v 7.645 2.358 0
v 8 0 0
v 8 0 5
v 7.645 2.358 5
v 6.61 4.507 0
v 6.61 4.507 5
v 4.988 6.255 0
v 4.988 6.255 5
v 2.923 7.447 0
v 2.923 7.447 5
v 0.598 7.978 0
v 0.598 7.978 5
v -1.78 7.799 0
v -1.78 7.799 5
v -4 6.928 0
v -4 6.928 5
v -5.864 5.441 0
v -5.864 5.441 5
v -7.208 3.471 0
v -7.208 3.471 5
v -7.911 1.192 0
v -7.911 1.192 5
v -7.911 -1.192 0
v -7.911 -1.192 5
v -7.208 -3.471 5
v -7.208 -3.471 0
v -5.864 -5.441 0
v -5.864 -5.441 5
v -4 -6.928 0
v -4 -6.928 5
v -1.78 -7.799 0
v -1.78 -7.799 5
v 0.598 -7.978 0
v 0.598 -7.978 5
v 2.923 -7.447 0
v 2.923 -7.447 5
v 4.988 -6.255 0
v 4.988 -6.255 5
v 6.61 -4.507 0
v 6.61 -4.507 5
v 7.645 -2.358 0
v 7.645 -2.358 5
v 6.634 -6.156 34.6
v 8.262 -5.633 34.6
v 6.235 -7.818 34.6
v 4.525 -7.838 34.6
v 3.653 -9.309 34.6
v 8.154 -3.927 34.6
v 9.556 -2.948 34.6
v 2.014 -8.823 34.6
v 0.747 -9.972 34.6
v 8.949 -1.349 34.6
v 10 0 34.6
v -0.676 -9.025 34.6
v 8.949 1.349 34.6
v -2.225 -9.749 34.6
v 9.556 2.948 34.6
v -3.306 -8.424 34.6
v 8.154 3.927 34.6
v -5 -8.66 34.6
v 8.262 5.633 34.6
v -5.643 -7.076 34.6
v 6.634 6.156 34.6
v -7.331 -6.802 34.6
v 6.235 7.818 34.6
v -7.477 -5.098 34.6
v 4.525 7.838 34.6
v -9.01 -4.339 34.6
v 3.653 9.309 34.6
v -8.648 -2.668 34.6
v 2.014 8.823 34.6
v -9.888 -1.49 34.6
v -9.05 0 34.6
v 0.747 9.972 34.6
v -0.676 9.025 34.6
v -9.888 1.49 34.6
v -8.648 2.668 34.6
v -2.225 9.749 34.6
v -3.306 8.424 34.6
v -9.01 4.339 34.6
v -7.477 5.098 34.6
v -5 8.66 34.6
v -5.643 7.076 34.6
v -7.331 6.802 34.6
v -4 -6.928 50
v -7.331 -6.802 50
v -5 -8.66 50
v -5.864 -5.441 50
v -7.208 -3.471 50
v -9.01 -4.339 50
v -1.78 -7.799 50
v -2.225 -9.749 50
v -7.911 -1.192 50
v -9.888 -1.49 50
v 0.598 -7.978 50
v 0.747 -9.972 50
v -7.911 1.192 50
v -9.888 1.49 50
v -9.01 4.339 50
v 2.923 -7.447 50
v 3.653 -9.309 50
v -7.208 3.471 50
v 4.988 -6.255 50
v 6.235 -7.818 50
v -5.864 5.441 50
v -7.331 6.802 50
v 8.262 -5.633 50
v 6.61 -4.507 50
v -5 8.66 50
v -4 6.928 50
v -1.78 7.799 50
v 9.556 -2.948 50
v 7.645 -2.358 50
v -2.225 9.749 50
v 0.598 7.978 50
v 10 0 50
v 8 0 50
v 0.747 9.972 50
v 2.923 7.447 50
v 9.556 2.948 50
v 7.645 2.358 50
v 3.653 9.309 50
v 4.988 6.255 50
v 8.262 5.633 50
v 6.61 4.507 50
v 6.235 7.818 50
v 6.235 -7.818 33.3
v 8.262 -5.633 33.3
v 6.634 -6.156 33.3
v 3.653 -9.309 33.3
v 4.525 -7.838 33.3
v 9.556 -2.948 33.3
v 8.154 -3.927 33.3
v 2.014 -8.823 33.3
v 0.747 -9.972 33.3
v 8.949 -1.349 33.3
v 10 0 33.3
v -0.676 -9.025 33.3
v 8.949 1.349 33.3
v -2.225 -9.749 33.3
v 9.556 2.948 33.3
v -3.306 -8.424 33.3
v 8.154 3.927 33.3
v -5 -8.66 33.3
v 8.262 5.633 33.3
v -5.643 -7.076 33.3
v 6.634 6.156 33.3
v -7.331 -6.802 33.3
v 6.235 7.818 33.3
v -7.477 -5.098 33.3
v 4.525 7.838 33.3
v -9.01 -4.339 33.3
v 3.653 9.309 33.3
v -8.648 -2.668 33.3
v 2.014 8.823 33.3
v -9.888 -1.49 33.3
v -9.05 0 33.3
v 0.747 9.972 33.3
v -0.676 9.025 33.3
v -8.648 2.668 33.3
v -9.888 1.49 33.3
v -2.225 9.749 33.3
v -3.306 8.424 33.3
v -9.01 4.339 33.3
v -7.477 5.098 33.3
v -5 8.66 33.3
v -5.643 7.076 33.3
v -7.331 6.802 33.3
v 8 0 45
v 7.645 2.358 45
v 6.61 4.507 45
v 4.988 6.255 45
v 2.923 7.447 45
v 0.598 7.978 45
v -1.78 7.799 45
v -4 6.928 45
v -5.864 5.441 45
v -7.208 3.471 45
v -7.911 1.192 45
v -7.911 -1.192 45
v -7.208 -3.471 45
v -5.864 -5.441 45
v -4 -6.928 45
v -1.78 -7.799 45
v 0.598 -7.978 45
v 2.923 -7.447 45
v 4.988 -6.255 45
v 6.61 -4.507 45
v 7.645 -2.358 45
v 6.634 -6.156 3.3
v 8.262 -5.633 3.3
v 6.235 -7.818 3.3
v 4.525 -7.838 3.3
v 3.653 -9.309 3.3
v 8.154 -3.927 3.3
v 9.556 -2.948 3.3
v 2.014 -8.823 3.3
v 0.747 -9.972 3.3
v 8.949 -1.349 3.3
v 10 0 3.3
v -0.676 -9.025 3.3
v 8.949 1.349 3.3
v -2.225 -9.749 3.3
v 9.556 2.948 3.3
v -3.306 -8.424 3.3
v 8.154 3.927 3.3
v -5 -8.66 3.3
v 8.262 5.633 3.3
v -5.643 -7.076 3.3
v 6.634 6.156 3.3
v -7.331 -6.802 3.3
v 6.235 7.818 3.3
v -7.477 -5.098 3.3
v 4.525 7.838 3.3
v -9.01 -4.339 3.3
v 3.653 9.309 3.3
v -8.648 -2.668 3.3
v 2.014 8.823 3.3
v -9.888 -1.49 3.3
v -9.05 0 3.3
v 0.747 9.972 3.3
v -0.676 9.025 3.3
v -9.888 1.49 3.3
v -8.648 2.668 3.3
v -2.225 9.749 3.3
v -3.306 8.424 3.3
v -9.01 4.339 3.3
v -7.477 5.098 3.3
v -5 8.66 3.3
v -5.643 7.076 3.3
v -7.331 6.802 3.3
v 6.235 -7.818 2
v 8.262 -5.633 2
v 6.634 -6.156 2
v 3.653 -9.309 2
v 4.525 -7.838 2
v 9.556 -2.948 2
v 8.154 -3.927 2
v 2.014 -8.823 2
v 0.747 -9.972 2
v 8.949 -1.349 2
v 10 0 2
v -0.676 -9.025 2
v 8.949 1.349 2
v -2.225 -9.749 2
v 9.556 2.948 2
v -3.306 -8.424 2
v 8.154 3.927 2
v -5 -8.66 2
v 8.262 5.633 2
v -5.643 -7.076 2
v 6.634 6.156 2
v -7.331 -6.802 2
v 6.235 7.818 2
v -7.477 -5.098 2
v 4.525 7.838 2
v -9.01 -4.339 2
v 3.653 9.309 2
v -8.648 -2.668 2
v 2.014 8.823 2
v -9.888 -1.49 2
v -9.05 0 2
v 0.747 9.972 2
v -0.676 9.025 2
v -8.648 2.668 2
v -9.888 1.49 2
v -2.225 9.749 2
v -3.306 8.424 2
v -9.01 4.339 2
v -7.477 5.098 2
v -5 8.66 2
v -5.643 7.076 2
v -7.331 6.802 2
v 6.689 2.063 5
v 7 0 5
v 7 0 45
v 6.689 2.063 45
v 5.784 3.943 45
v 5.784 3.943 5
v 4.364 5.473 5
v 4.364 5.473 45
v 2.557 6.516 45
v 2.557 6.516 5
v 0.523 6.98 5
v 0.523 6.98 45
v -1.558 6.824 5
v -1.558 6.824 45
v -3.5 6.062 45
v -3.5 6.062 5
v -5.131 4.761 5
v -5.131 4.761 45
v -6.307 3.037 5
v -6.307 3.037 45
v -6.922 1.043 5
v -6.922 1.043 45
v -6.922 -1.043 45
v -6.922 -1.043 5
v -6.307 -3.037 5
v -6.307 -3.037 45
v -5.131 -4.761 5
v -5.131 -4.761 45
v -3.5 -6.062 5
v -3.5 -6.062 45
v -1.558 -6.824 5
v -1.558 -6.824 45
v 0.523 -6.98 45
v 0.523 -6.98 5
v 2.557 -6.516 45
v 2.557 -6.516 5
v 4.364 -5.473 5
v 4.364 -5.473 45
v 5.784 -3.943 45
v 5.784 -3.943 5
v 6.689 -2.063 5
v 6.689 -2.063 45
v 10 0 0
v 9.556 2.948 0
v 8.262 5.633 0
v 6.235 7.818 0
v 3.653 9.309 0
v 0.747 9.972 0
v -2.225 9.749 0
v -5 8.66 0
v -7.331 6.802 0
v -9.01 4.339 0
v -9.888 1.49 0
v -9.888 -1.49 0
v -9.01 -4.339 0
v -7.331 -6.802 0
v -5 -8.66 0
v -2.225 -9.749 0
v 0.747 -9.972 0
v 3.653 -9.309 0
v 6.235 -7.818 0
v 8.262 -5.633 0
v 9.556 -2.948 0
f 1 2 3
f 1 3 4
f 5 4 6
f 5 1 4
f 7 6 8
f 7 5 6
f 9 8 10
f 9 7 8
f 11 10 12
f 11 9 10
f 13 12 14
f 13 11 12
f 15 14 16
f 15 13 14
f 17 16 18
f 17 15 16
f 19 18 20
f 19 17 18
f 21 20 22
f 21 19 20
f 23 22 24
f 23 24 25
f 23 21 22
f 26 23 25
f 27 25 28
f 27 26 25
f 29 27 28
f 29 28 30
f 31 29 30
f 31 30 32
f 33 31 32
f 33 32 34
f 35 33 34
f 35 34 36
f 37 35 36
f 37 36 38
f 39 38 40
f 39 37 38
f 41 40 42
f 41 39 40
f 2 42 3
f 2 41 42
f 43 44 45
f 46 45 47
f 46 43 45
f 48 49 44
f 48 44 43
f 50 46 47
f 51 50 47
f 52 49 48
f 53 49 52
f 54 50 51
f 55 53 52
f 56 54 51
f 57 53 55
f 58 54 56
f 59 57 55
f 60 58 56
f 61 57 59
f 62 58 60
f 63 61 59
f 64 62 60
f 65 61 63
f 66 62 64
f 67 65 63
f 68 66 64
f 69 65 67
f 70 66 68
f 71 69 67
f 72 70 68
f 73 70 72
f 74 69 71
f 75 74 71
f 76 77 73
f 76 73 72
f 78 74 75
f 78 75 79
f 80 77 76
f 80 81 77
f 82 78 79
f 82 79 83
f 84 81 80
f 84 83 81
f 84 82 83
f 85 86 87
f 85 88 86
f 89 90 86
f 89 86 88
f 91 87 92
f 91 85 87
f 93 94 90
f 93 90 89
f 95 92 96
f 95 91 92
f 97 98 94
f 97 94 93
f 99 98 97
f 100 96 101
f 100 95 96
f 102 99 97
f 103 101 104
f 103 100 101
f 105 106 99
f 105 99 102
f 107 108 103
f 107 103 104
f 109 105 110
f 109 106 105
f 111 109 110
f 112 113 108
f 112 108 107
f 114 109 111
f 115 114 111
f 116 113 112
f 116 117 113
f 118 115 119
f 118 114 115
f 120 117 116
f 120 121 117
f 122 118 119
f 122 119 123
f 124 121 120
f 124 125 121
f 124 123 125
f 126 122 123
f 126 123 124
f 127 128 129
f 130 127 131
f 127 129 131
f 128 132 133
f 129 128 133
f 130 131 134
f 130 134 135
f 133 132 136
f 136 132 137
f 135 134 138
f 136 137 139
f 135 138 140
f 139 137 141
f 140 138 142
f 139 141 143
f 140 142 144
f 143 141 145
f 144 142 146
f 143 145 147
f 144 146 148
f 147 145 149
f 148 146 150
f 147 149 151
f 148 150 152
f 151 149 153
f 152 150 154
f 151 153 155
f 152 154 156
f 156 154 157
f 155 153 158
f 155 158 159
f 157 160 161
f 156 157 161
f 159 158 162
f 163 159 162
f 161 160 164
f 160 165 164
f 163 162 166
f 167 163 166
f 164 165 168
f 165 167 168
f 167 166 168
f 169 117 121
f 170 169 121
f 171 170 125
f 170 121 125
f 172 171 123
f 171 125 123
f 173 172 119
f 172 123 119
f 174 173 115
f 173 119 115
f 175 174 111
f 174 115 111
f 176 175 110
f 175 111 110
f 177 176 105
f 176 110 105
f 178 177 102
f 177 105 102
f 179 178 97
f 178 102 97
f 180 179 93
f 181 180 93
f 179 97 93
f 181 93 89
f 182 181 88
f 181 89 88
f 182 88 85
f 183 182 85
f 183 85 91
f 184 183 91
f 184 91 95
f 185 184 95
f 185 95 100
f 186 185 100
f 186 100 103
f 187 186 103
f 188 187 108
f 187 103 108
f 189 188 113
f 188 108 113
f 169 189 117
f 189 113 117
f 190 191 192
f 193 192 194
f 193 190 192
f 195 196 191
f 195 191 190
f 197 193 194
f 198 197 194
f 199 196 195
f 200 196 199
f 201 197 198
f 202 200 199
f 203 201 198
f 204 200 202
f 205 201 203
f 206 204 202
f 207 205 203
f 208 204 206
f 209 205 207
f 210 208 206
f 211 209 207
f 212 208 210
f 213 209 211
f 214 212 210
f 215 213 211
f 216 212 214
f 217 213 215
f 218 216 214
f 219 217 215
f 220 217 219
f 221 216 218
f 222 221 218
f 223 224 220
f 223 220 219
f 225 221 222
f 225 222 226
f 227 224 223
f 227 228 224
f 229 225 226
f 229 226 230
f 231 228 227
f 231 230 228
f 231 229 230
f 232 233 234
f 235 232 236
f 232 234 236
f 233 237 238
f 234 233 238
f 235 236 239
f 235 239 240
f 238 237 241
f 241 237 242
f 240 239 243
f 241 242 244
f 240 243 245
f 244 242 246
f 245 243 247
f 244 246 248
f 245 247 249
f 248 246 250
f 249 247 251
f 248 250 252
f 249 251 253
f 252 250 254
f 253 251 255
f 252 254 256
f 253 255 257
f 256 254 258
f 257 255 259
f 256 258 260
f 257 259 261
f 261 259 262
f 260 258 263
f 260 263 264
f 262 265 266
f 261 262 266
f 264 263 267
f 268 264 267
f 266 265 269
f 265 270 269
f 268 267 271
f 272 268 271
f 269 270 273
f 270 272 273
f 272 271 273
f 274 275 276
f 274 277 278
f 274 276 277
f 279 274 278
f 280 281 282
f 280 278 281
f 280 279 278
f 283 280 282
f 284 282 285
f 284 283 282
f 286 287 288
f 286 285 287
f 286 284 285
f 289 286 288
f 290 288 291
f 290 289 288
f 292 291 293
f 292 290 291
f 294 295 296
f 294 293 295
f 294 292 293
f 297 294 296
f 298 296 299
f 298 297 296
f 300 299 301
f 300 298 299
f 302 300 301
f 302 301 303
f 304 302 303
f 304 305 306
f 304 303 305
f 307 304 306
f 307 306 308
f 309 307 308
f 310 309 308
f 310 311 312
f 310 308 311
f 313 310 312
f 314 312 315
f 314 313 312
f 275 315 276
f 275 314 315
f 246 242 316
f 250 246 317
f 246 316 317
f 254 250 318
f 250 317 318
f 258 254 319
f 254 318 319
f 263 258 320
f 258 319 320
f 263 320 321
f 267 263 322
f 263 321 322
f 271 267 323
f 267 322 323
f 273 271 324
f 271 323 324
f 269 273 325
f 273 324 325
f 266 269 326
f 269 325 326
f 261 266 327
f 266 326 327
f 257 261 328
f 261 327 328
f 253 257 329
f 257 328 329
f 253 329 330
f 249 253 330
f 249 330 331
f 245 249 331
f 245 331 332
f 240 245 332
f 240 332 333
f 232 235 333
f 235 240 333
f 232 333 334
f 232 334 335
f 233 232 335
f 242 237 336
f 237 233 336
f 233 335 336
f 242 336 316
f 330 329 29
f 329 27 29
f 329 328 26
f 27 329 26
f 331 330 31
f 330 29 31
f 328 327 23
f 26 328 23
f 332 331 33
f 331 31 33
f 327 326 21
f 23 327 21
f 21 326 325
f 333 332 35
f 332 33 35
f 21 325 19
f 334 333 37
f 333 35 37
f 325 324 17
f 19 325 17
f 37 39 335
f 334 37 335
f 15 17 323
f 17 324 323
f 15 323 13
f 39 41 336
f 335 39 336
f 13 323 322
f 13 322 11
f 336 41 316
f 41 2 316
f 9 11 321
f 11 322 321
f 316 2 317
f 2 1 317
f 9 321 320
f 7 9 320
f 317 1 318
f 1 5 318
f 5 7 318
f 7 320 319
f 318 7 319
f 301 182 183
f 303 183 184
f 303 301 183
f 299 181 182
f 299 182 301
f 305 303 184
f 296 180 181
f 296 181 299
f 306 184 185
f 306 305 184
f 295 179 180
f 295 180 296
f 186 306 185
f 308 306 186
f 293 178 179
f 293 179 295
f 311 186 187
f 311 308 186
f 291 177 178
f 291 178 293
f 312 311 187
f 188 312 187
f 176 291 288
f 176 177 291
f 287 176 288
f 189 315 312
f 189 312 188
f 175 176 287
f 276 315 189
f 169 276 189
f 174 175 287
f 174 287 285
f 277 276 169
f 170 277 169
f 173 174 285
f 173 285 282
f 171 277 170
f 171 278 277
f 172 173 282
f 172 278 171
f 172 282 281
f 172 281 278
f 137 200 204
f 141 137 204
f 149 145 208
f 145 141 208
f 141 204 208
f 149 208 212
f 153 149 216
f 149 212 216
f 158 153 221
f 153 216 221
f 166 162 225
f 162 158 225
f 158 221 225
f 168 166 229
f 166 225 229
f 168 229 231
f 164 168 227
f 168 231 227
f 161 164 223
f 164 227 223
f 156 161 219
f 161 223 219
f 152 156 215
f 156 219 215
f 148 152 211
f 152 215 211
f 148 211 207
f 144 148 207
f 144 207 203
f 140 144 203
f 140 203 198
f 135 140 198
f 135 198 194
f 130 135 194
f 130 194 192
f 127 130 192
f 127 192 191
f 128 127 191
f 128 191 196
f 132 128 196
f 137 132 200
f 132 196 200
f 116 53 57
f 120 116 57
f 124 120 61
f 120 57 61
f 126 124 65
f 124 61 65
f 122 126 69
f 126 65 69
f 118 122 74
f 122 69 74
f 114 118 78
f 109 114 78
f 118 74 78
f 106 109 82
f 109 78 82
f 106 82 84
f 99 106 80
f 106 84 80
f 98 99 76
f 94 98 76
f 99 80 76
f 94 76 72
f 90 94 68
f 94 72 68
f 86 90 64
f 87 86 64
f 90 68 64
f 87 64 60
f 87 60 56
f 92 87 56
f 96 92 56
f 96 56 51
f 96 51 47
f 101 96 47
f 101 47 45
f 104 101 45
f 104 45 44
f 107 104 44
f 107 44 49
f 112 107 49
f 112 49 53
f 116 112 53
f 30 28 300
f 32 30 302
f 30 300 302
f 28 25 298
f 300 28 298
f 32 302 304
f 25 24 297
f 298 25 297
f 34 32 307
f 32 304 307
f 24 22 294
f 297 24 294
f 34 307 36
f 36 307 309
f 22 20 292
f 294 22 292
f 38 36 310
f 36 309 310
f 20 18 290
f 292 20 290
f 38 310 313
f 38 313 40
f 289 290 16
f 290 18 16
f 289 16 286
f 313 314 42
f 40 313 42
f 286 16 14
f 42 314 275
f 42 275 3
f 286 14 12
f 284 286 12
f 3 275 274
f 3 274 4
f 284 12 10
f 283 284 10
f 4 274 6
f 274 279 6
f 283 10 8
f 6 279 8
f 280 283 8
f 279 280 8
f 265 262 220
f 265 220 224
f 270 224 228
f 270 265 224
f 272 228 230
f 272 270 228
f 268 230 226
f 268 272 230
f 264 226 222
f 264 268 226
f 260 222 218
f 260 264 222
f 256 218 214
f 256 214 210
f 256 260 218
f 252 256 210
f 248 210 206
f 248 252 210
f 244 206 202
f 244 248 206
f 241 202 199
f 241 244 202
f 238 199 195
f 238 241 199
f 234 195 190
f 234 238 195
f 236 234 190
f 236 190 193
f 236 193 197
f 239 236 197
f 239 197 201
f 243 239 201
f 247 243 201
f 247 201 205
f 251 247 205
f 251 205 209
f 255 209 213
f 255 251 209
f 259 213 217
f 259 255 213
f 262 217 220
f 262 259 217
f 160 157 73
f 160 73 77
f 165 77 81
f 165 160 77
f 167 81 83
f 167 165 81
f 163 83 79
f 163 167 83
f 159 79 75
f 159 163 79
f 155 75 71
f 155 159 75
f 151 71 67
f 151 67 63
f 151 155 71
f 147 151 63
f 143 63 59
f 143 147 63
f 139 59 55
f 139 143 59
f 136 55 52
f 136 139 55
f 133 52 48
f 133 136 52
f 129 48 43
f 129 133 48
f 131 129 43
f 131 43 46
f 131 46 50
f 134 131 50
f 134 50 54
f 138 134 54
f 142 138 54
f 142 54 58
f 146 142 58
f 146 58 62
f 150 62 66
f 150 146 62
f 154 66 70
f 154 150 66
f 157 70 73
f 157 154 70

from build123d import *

# Parameters (mm, degrees)
SKETCH1_R          = 10
SKETCH1_R_2        = 7
MAIN_DEPTH         = 50
SKETCH2_R          = 8
BEARING_CUT_DEPTH  = 5
SKETCH5_R          = 10
SKETCH5_R_2        = 9.05
CUT_EXTRUDE2_DEPTH = 1.3
SKETCH6_R          = 10
SKETCH6_R_2        = 9.05
CUT_EXTRUDE3_DEPTH = 1.3


with BuildPart() as part:
    # Sketch1 → Main (new body)
    with BuildSketch(Plane.XY):
        Circle(SKETCH1_R)
        Circle(SKETCH1_R_2, mode=Mode.SUBTRACT)
    extrude(amount=MAIN_DEPTH)

    # Sketch2 → Bearing Cut (cut)
    with BuildSketch(Plane.XY.offset(50)):
        Circle(SKETCH2_R)
    bearing_cut = extrude(amount=-BEARING_CUT_DEPTH, mode=Mode.SUBTRACT)

    # Mirror1: Bearing Cut across plane
    add(bearing_cut.mirror(Plane.XY.offset(25)), mode=Mode.SUBTRACT)

    # Sketch5 → Cut-Extrude2 (cut)
    with BuildSketch(Plane(origin=(0, 0, 2), x_dir=(-1, 0, 0), z_dir=(0, 0, -1))):
        Circle(SKETCH5_R)
        Circle(SKETCH5_R_2, mode=Mode.SUBTRACT)
    extrude(amount=-CUT_EXTRUDE2_DEPTH, mode=Mode.SUBTRACT)

    # Sketch6 → Cut-Extrude3 (cut)
    with BuildSketch(Plane(origin=(0, 0, 33.3), x_dir=(-1, 0, 0), z_dir=(0, 0, -1))):
        Circle(SKETCH6_R)
        Circle(SKETCH6_R_2, mode=Mode.SUBTRACT)
    extrude(amount=-CUT_EXTRUDE3_DEPTH, mode=Mode.SUBTRACT)


solid = part.part
